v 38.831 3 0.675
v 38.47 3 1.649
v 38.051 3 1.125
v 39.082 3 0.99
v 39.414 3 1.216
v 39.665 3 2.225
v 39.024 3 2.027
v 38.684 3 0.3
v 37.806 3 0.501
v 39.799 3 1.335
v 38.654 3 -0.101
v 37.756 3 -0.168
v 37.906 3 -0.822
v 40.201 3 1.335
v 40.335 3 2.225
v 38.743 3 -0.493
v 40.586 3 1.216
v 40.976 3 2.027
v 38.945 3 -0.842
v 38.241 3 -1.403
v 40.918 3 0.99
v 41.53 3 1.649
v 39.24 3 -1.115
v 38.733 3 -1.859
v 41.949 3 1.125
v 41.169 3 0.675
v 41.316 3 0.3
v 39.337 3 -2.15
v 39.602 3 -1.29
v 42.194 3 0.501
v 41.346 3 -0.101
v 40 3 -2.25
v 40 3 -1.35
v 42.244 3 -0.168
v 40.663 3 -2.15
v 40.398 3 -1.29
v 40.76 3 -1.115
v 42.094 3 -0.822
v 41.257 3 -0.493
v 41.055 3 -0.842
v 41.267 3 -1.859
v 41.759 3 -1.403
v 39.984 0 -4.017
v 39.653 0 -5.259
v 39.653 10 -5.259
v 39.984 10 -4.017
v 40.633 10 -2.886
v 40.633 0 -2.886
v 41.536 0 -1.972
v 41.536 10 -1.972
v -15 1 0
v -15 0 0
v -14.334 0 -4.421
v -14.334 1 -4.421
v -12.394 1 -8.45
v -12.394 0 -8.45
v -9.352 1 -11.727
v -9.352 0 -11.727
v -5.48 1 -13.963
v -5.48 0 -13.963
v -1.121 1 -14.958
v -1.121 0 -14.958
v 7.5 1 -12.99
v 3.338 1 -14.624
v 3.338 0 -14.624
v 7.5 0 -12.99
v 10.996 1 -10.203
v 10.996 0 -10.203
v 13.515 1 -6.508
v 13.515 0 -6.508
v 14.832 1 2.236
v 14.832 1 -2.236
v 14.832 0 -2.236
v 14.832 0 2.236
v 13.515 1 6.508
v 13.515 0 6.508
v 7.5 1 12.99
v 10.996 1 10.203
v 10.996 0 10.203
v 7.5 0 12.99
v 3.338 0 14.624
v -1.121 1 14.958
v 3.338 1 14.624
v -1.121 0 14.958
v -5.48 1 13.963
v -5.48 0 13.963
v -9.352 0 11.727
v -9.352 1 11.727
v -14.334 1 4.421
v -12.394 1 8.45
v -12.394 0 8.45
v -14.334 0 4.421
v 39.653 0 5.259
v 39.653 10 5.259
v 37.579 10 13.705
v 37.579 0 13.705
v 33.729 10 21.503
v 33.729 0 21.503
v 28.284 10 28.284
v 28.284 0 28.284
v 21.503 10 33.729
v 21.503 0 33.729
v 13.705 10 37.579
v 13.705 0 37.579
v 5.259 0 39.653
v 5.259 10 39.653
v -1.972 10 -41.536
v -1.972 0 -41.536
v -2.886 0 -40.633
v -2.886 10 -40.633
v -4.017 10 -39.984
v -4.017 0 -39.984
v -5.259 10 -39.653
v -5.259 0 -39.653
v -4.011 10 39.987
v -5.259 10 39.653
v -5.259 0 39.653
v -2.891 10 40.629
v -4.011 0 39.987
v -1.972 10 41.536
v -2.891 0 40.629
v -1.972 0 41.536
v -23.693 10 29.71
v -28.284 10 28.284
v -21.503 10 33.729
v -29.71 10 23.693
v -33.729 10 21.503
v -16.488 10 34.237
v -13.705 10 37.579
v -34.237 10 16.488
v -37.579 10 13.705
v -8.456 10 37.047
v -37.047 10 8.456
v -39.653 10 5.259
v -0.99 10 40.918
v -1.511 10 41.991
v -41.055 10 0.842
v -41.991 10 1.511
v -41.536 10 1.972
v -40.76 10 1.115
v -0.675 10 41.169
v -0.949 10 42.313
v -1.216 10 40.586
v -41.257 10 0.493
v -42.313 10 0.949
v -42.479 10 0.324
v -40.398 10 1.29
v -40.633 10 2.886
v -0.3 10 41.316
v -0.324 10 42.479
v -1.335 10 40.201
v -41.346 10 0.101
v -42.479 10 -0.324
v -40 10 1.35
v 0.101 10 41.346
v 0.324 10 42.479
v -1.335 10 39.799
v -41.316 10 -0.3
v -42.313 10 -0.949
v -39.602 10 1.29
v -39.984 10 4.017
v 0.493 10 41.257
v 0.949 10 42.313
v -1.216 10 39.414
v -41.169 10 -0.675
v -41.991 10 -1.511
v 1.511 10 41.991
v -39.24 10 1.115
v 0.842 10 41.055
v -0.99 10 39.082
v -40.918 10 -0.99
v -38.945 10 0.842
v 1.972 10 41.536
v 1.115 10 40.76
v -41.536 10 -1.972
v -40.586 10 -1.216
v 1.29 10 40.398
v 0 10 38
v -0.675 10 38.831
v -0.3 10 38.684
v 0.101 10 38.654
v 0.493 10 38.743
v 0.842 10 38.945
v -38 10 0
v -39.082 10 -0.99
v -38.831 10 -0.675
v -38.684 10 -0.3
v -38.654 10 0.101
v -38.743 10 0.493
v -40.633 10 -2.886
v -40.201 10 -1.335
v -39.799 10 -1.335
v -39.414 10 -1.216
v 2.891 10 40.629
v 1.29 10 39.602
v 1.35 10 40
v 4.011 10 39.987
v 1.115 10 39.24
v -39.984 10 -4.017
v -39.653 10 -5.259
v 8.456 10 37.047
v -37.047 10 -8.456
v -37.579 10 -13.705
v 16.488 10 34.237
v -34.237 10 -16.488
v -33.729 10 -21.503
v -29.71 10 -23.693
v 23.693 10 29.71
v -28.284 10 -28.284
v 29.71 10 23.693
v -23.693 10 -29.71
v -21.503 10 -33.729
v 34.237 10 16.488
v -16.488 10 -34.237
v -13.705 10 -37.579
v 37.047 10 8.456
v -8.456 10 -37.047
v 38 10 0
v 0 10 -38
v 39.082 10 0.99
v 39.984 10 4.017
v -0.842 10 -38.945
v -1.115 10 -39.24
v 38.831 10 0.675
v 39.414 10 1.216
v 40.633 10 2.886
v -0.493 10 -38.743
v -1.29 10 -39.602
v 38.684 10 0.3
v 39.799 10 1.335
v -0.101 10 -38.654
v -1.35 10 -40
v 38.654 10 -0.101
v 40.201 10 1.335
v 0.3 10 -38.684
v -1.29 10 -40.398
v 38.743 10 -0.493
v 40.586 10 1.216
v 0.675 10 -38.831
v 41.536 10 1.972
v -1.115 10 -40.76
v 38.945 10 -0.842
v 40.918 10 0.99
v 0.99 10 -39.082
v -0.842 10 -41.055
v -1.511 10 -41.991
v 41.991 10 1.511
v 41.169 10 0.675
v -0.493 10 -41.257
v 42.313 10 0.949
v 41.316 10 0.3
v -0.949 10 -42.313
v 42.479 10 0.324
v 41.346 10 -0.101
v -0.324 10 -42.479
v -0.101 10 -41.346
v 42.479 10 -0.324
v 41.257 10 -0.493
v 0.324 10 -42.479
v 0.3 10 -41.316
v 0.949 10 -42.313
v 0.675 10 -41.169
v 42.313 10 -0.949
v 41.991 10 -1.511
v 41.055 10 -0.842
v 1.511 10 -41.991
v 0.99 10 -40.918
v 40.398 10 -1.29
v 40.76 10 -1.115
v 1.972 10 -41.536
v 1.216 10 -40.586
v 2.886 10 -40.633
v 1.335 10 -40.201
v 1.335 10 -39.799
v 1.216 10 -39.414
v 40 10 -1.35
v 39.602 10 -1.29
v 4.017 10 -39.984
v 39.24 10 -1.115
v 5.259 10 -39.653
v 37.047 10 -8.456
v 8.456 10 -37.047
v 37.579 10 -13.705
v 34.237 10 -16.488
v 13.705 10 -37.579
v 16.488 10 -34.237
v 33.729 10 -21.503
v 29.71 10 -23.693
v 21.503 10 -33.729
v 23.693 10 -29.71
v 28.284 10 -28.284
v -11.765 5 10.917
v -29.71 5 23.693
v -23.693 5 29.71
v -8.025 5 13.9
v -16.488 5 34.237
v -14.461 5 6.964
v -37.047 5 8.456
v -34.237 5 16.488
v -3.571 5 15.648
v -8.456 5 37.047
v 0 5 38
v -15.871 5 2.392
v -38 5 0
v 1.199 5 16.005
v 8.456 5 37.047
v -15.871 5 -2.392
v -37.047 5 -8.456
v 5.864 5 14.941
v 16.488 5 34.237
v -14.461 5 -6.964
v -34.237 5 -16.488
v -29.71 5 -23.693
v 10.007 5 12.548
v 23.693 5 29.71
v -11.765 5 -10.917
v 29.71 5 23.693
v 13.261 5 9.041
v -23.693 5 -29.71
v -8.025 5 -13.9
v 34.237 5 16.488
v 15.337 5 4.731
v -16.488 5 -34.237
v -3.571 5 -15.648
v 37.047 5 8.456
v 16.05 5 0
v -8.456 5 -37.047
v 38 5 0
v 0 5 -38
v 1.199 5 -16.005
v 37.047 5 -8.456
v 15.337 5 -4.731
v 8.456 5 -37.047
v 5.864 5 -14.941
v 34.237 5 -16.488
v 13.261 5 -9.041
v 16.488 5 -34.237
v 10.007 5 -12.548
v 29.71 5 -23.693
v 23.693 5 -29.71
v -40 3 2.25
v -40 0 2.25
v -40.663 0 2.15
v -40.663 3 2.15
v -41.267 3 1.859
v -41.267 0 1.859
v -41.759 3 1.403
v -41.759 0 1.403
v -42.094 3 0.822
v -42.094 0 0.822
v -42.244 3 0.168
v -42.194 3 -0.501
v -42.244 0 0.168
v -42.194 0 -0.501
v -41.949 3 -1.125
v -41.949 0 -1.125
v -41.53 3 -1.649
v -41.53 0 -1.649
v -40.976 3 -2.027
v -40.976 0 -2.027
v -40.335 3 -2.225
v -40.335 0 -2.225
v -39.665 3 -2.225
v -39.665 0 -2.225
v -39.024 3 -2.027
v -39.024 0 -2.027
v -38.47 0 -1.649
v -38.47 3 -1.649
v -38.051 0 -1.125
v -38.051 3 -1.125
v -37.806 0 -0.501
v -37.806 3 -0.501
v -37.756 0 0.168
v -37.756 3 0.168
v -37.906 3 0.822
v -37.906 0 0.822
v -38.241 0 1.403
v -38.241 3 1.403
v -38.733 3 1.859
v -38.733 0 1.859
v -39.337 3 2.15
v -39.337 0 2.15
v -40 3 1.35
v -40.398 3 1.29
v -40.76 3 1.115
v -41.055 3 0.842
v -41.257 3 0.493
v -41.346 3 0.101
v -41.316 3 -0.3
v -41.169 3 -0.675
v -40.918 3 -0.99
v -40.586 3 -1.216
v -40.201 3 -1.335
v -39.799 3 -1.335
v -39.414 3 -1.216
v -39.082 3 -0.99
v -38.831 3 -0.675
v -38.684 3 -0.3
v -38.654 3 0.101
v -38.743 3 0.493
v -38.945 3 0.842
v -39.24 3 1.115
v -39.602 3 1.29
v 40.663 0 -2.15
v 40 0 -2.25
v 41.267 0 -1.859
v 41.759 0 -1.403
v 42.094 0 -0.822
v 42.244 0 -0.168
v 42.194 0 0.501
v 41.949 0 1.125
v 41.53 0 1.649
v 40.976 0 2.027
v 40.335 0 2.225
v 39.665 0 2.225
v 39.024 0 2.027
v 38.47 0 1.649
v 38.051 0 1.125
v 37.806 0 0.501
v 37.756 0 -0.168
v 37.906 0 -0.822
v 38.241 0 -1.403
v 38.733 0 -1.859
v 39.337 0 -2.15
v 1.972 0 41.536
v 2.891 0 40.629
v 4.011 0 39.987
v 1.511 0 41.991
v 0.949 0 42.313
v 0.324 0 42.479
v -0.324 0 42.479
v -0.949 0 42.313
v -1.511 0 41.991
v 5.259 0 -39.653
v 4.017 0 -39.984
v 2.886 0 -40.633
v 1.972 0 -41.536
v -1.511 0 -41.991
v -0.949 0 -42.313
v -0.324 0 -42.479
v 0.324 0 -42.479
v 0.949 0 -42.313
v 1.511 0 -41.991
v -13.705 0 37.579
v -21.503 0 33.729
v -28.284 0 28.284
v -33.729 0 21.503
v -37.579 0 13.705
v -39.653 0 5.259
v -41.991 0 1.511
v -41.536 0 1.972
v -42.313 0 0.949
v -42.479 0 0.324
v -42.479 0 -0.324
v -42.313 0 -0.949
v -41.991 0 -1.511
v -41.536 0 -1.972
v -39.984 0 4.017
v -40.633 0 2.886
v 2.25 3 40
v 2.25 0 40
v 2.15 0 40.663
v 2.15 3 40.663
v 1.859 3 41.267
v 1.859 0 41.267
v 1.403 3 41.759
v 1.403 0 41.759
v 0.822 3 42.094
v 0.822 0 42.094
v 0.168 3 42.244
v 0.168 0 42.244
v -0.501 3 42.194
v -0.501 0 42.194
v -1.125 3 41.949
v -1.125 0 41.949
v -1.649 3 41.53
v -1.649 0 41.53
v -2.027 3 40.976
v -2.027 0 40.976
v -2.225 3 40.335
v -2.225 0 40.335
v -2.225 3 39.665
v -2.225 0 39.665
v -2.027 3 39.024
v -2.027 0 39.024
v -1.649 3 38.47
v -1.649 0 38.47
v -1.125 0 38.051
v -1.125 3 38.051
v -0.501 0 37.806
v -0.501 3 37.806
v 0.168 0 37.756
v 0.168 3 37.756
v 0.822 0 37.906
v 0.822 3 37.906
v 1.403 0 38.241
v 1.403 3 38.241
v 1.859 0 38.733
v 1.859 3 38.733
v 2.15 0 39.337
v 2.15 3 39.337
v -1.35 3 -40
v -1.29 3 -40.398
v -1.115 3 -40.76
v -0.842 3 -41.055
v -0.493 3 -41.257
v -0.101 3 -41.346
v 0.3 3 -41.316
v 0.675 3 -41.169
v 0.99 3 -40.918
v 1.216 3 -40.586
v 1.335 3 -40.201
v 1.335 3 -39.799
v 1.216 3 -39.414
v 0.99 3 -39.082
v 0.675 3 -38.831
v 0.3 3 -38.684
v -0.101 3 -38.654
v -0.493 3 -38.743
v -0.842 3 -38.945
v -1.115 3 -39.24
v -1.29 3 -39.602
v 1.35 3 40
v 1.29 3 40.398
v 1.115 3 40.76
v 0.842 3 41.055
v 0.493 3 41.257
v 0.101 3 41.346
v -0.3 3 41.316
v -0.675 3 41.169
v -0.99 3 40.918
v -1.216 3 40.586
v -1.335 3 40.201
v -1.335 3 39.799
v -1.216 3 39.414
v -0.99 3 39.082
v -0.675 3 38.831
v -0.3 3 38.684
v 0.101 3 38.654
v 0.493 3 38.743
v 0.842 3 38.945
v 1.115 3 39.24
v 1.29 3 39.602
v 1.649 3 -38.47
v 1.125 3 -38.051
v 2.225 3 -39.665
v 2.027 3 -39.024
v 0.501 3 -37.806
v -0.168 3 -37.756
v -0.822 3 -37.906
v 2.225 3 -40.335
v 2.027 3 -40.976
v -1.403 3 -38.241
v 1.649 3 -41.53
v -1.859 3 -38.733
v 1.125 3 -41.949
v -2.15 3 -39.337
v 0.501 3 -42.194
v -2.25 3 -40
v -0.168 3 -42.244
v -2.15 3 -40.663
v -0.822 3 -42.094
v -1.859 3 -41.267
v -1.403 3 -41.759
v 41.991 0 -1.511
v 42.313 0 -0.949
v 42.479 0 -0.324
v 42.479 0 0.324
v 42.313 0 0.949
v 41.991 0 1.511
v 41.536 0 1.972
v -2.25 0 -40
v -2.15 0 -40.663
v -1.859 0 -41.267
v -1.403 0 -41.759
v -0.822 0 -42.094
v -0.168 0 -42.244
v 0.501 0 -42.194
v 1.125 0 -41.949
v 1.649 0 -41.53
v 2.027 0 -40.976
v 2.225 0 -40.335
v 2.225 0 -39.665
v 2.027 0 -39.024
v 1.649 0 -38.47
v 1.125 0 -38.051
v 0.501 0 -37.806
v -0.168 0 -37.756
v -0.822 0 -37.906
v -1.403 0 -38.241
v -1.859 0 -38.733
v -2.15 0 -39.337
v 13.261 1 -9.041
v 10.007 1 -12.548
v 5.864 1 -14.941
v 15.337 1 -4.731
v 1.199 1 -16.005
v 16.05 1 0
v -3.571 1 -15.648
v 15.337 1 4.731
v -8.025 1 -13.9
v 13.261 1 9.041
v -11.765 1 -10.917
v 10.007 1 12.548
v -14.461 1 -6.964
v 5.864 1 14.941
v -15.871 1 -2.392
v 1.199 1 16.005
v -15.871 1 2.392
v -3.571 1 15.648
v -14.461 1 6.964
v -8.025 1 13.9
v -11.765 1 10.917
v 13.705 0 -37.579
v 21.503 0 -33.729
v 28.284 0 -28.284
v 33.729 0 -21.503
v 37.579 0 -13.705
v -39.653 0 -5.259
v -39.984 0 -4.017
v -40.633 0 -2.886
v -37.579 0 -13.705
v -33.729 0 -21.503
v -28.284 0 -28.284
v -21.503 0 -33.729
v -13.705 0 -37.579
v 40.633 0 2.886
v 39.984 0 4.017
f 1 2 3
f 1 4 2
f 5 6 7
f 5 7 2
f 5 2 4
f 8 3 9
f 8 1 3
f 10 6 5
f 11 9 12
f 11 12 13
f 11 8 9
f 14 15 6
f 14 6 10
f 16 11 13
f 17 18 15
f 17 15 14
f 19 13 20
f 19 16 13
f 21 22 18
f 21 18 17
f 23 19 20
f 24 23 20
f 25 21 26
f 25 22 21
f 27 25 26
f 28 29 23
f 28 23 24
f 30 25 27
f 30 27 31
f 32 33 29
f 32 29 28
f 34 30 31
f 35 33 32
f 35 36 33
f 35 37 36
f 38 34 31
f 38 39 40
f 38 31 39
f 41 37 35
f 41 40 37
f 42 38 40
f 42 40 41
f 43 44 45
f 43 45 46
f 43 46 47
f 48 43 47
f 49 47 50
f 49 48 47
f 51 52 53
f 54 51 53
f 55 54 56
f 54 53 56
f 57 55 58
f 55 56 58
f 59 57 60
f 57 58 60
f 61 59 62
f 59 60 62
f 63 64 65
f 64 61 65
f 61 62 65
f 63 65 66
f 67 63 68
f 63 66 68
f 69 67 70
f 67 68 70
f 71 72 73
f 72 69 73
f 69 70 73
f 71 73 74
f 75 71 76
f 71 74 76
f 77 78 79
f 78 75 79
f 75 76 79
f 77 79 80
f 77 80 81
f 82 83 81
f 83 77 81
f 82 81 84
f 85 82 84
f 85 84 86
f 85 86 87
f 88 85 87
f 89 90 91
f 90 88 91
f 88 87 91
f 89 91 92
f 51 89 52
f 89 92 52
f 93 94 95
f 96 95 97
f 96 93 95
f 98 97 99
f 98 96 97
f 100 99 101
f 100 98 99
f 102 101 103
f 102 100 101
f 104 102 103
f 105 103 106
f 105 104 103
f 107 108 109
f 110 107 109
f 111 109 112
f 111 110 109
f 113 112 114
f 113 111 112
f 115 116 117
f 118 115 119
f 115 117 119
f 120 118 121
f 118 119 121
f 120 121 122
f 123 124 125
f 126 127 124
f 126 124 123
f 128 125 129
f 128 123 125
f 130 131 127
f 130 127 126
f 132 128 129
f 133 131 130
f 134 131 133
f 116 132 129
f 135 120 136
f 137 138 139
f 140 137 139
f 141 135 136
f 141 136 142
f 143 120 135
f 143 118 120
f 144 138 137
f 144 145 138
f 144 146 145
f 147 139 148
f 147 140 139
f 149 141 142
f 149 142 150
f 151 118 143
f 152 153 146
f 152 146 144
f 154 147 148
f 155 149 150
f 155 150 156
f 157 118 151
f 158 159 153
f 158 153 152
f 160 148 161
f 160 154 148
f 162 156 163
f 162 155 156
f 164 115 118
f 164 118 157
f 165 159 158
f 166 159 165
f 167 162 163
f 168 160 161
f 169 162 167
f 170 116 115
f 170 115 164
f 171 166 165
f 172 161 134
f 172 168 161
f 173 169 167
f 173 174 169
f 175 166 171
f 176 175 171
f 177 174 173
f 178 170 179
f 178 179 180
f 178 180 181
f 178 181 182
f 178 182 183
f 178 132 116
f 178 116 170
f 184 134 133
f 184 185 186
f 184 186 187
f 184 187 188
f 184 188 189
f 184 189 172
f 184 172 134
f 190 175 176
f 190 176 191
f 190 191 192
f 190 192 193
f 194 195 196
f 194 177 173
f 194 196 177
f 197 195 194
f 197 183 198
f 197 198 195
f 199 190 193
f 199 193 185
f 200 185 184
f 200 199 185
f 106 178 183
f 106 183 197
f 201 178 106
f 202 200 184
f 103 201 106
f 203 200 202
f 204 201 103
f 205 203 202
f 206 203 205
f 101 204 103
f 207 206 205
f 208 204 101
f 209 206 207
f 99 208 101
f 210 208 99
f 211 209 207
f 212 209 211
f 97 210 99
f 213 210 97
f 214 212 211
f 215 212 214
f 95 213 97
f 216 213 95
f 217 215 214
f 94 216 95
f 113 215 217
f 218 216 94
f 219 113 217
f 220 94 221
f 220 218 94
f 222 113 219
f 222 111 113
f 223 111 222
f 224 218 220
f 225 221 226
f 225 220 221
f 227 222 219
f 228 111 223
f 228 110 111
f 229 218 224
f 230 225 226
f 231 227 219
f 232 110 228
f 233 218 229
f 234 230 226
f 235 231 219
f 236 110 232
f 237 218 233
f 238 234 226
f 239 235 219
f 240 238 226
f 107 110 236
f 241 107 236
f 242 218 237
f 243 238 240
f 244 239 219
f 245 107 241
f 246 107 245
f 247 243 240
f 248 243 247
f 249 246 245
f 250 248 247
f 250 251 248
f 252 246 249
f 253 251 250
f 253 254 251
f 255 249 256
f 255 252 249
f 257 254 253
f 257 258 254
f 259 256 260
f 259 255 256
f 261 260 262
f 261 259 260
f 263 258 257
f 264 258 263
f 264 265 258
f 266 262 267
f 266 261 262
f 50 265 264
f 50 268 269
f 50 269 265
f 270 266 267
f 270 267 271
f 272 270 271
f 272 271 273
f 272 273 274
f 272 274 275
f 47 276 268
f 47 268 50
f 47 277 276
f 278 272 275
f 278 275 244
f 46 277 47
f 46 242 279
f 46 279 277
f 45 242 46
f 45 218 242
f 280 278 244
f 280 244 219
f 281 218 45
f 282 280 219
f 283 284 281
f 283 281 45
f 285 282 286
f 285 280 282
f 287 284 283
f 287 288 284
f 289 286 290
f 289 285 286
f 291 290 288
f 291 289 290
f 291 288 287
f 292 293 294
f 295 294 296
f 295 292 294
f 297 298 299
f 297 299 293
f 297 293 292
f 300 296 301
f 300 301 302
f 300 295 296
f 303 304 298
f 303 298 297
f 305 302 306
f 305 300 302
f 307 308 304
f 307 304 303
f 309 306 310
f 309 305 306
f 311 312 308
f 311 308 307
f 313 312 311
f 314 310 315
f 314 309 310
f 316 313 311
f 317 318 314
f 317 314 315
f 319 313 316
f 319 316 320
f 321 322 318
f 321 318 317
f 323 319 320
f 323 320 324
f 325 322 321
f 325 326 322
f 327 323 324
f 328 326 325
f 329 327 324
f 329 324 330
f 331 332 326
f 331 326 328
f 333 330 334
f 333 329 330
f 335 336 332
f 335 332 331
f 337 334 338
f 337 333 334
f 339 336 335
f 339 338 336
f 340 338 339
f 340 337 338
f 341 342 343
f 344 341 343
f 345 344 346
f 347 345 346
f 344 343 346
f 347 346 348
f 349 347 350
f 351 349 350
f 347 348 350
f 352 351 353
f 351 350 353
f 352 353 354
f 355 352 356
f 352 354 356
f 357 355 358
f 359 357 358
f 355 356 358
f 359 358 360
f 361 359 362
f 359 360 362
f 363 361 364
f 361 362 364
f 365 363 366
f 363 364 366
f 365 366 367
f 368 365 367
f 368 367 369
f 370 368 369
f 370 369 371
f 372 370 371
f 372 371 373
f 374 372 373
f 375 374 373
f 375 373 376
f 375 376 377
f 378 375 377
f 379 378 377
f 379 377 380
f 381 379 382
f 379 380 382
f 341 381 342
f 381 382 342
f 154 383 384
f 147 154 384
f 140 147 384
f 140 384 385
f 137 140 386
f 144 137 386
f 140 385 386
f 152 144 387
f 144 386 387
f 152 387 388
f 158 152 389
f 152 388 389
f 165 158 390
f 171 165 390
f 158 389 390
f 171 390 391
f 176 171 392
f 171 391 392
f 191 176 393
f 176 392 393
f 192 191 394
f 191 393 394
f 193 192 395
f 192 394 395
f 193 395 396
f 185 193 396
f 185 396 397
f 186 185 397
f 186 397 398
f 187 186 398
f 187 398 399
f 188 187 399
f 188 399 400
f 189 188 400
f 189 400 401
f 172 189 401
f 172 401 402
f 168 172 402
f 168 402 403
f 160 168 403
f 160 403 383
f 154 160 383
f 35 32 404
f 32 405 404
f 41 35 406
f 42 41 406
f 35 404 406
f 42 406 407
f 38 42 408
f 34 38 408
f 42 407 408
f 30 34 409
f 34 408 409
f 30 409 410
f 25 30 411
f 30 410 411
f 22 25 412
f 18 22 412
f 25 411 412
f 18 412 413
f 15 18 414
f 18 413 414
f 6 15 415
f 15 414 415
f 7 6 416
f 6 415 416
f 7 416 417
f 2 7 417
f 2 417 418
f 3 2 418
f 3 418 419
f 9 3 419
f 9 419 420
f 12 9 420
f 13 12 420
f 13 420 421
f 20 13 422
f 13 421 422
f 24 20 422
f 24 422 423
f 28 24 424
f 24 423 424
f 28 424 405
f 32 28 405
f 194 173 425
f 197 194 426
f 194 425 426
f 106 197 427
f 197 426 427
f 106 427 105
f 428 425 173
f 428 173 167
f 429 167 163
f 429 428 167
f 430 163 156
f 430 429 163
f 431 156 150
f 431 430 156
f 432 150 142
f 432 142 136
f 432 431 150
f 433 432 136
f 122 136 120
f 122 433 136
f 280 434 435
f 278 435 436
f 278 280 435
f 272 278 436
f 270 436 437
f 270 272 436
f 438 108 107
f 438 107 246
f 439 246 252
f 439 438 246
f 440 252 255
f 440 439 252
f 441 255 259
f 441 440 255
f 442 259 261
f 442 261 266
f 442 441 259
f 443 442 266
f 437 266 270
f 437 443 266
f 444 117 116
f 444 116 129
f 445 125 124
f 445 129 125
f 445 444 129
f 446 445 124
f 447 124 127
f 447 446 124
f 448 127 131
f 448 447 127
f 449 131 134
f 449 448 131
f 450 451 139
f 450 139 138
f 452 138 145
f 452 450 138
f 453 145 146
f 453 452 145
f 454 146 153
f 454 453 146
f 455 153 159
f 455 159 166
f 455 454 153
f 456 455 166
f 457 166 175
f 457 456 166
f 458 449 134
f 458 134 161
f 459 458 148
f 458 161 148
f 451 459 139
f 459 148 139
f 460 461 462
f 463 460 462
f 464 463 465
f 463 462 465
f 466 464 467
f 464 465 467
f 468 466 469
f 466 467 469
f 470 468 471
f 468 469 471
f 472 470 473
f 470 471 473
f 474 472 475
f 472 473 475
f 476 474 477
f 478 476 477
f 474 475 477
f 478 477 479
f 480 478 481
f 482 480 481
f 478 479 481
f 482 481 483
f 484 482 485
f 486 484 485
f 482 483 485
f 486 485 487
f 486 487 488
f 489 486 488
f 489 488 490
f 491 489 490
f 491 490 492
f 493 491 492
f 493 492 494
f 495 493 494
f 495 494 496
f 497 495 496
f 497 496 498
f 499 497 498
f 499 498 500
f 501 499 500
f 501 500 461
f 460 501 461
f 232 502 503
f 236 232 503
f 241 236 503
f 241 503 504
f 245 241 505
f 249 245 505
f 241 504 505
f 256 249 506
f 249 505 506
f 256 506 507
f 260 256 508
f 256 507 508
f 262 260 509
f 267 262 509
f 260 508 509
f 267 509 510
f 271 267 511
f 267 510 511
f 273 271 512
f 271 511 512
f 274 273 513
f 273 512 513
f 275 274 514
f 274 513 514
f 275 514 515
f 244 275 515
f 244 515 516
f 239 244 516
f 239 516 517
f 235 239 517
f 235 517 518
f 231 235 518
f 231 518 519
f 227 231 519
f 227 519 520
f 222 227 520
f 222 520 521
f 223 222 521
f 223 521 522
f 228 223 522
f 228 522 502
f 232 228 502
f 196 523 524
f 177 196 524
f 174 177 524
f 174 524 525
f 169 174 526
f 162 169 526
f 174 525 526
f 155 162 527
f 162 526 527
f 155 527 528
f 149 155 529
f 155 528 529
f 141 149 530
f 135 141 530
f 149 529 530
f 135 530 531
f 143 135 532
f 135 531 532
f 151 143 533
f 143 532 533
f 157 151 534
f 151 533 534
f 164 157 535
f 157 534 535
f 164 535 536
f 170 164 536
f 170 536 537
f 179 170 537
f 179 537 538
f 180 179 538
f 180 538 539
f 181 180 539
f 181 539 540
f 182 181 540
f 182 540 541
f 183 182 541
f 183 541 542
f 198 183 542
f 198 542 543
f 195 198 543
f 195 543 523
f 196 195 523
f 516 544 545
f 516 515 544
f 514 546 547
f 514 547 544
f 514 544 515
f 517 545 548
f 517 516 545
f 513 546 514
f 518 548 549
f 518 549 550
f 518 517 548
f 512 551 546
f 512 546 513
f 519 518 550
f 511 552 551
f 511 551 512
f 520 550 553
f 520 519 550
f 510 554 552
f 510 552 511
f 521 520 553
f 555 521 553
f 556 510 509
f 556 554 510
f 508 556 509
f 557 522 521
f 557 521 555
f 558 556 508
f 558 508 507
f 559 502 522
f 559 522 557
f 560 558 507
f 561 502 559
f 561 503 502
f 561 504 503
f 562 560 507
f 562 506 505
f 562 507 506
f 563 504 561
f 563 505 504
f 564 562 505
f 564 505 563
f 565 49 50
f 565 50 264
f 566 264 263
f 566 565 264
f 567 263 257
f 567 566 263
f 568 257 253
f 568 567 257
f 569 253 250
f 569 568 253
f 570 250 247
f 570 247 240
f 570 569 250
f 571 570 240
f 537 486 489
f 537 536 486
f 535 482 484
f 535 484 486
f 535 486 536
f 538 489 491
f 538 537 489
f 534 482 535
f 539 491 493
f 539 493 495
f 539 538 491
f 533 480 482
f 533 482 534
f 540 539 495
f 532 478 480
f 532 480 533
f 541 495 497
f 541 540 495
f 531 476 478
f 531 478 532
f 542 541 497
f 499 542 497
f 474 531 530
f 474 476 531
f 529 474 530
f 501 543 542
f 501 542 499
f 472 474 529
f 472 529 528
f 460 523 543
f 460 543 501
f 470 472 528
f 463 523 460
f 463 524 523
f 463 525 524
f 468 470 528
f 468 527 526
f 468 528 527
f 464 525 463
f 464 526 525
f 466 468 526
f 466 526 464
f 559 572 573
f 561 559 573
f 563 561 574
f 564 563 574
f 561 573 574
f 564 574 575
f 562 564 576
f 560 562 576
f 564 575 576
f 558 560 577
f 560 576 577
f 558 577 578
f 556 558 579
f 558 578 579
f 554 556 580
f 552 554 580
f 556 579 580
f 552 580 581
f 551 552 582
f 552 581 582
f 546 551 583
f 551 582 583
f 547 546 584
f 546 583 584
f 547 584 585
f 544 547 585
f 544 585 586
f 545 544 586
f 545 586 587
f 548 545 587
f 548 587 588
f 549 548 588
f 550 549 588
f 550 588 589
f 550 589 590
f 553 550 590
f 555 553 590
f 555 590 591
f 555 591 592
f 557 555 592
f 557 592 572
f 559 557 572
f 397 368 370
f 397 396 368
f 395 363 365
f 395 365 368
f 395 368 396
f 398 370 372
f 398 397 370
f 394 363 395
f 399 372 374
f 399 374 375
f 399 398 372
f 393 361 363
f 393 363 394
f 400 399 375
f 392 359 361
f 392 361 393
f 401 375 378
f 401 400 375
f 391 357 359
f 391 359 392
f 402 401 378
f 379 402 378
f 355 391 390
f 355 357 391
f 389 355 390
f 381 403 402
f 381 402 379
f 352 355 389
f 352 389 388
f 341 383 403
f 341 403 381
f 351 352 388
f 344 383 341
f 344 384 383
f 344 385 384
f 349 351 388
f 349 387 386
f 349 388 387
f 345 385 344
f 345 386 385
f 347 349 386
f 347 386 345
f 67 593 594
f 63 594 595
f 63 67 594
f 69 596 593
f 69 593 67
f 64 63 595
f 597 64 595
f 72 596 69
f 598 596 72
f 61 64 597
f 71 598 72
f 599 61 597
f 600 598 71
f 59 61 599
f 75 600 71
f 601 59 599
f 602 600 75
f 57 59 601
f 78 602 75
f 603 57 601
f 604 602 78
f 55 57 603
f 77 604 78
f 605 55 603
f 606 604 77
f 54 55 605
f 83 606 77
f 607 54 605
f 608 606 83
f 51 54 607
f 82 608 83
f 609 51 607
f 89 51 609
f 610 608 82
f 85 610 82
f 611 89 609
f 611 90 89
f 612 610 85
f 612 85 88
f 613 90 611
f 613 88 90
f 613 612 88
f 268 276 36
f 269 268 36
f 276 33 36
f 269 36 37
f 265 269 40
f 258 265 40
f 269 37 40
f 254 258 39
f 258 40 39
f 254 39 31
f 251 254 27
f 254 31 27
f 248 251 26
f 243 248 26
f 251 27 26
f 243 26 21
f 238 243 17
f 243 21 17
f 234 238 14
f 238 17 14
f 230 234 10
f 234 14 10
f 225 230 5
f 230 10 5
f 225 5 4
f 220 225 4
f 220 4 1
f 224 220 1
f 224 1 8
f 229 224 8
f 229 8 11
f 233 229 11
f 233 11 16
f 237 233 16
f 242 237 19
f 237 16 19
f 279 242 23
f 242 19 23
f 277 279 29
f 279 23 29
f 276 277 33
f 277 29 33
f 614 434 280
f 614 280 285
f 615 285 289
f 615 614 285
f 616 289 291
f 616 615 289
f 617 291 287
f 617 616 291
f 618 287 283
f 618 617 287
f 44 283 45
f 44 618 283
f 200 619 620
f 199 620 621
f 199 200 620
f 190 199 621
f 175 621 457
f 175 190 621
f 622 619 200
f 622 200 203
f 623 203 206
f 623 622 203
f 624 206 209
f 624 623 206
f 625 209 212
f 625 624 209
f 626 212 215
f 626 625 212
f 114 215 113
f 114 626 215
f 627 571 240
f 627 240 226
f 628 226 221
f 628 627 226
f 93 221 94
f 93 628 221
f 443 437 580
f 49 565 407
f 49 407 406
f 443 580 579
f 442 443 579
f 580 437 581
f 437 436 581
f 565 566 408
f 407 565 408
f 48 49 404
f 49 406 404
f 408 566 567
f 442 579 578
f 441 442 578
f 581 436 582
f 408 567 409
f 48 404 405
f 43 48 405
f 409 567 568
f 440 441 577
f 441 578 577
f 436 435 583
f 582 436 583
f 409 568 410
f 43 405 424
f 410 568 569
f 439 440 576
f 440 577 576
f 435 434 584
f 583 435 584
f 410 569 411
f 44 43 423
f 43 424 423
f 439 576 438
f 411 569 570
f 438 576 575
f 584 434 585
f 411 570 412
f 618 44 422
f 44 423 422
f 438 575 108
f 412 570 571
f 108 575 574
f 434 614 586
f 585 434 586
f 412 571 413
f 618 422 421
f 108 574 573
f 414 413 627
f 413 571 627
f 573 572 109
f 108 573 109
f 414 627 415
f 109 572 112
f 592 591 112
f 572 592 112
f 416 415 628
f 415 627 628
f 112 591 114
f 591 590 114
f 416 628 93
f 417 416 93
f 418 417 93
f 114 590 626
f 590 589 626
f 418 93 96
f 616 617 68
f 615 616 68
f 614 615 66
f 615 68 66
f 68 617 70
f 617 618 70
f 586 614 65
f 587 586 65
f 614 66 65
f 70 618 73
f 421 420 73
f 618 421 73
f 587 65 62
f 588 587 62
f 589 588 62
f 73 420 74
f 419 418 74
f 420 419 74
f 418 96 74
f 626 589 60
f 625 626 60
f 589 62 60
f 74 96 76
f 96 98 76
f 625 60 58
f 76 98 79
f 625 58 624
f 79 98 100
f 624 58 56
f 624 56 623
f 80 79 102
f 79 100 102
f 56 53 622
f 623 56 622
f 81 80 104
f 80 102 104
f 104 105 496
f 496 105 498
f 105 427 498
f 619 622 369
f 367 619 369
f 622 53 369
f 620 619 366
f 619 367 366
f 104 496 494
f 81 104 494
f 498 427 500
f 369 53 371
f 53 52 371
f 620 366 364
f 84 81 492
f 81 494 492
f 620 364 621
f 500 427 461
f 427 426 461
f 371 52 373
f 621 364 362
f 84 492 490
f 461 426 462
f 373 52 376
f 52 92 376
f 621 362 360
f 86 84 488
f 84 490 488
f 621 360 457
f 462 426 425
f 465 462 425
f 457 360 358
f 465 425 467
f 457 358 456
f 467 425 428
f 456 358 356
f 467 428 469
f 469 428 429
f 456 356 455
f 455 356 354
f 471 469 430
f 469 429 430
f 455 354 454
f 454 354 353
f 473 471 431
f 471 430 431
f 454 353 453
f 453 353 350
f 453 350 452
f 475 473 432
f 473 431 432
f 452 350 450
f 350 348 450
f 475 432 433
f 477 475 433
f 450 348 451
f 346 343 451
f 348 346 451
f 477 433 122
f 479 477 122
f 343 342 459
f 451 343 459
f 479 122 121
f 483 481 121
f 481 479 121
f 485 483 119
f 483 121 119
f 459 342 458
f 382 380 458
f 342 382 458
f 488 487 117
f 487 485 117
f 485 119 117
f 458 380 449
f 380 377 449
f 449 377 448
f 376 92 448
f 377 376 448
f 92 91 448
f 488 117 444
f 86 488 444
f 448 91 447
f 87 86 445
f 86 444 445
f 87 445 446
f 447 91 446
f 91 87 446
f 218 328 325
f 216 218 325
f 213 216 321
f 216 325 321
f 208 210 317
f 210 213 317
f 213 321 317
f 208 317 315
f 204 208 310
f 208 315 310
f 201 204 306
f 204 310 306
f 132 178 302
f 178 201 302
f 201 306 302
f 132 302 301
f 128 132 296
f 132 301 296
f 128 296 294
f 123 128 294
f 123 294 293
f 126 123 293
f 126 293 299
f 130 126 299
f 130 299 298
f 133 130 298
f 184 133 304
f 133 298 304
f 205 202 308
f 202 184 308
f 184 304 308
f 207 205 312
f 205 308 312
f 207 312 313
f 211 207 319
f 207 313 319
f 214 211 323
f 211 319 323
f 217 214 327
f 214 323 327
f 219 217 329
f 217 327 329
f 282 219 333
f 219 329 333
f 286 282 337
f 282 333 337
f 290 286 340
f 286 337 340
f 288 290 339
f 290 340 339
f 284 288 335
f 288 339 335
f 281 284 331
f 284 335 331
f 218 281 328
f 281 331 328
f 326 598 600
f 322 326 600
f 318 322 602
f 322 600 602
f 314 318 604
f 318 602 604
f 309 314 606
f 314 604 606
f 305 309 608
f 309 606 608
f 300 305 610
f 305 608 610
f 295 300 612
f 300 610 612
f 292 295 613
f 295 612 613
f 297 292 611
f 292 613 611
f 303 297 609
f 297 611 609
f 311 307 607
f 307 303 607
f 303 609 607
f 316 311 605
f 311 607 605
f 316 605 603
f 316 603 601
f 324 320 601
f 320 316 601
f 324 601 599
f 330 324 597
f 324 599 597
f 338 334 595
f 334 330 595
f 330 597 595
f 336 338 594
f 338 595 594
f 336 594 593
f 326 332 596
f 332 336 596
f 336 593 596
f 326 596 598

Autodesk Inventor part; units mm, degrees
ref_plane "YZ Plane" through (0, 0, 0) normal (1, 0, 0) x (0, 1, 0)
ref_plane "XZ Plane" through (0, 0, 0) normal (0, 1, 0) x (-1, 0, 0)
ref_plane "XY Plane" through (0, 0, 0) normal (0, 0, 1) x (1, 0, 0)
sketch "Szkic1" plane through (0, 0, 0) normal (0, 1, 0) x (-1, 0, 0)
  circle A0 centre (0, 0) radius 40
  circle A1 centre (0, 0) radius 15
  dimension "d0" = 80
  dimension "d1" = 30
extrude "Wyciągnięcie proste1" add sketch "Szkic1" along normal blind 1
sketch "Szkic2" plane through (0, 1, 0) normal (0, 1, 0) x (1, 0, 0)
  circle A0 centre (0, 0) radius 40
  circle A1 centre (0, 0) radius 16.05
  dimension "d4" = 32.1
extrude "Wyciągnięcie proste2" add sketch "Szkic2" along normal blind 4
sketch "Szkic3" plane through (0, 5, 0) normal (0, 1, 0) x (1, 0, 0)
  circle A0 centre (0, 0) radius 40
  circle A1 centre (0, 0) radius 38
  dimension "d7" = 76
extrude "Wyciągnięcie proste3" add sketch "Szkic3" along normal blind 5
sketch "Szkic4" plane through (0, 0, 0) normal (0, -1, 0) x (1, 0, 0)
  circle A0 centre (0, 0) radius 40 projected
  circle A1 centre (0, 40) radius 1.35
  circle A2 centre (0, 40) radius 2.5
  point P0 (2.4988, 39.9219)
  point P1 (-2.4988, 39.9219)
  dimension "d10" = 2.7
  dimension "d11" = 5
extrude "Wyciągnięcie proste4" add sketch "Szkic4" against normal blind 10 contours A0 A1 A2 | A0 A1 picked at (1.9426, 40.8023) picked at (0.0508, 40.4454)
fillet "Zaokrąglenie1" radius 5 4 edges at (2.4988, 0.5, 39.9219) (2.4988, 5.5, 39.9219) (-2.4988, 5.5, 39.9219) (-2.4988, 0.5, 39.9219)
sketch "Szkic5" plane through (0, 0, 0) normal (0, -1, 0) x (1, 0, 0)
  circle A0 centre (0, 40) radius 1.35
  point P0 (0, 0)
  dimension "d15" = 2.7
extrude "Wyciągnięcie proste5" cut sketch "Szkic5" against normal blind 10
sketch "Szkic6" plane through (0, 0, 0) normal (0, -1, 0) x (1, 0, 0)
  circle A0 centre (0, 40) radius 1.35 projected
  circle A1 centre (0, 40) radius 2.25
  point P0 (0, 0)
  dimension "d18" = 4.5
extrude "Wyciągnięcie proste6" cut sketch "Szkic6" against normal blind 3
pattern_circular "Szyk kołowy1" count 4 over 360 about axis through (0, 0, 0) along (0, 1, 0) of "Wyciągnięcie proste5", "Wyciągnięcie proste6", "Zaokrąglenie1", "Wyciągnięcie proste4"
properties part number "End"
